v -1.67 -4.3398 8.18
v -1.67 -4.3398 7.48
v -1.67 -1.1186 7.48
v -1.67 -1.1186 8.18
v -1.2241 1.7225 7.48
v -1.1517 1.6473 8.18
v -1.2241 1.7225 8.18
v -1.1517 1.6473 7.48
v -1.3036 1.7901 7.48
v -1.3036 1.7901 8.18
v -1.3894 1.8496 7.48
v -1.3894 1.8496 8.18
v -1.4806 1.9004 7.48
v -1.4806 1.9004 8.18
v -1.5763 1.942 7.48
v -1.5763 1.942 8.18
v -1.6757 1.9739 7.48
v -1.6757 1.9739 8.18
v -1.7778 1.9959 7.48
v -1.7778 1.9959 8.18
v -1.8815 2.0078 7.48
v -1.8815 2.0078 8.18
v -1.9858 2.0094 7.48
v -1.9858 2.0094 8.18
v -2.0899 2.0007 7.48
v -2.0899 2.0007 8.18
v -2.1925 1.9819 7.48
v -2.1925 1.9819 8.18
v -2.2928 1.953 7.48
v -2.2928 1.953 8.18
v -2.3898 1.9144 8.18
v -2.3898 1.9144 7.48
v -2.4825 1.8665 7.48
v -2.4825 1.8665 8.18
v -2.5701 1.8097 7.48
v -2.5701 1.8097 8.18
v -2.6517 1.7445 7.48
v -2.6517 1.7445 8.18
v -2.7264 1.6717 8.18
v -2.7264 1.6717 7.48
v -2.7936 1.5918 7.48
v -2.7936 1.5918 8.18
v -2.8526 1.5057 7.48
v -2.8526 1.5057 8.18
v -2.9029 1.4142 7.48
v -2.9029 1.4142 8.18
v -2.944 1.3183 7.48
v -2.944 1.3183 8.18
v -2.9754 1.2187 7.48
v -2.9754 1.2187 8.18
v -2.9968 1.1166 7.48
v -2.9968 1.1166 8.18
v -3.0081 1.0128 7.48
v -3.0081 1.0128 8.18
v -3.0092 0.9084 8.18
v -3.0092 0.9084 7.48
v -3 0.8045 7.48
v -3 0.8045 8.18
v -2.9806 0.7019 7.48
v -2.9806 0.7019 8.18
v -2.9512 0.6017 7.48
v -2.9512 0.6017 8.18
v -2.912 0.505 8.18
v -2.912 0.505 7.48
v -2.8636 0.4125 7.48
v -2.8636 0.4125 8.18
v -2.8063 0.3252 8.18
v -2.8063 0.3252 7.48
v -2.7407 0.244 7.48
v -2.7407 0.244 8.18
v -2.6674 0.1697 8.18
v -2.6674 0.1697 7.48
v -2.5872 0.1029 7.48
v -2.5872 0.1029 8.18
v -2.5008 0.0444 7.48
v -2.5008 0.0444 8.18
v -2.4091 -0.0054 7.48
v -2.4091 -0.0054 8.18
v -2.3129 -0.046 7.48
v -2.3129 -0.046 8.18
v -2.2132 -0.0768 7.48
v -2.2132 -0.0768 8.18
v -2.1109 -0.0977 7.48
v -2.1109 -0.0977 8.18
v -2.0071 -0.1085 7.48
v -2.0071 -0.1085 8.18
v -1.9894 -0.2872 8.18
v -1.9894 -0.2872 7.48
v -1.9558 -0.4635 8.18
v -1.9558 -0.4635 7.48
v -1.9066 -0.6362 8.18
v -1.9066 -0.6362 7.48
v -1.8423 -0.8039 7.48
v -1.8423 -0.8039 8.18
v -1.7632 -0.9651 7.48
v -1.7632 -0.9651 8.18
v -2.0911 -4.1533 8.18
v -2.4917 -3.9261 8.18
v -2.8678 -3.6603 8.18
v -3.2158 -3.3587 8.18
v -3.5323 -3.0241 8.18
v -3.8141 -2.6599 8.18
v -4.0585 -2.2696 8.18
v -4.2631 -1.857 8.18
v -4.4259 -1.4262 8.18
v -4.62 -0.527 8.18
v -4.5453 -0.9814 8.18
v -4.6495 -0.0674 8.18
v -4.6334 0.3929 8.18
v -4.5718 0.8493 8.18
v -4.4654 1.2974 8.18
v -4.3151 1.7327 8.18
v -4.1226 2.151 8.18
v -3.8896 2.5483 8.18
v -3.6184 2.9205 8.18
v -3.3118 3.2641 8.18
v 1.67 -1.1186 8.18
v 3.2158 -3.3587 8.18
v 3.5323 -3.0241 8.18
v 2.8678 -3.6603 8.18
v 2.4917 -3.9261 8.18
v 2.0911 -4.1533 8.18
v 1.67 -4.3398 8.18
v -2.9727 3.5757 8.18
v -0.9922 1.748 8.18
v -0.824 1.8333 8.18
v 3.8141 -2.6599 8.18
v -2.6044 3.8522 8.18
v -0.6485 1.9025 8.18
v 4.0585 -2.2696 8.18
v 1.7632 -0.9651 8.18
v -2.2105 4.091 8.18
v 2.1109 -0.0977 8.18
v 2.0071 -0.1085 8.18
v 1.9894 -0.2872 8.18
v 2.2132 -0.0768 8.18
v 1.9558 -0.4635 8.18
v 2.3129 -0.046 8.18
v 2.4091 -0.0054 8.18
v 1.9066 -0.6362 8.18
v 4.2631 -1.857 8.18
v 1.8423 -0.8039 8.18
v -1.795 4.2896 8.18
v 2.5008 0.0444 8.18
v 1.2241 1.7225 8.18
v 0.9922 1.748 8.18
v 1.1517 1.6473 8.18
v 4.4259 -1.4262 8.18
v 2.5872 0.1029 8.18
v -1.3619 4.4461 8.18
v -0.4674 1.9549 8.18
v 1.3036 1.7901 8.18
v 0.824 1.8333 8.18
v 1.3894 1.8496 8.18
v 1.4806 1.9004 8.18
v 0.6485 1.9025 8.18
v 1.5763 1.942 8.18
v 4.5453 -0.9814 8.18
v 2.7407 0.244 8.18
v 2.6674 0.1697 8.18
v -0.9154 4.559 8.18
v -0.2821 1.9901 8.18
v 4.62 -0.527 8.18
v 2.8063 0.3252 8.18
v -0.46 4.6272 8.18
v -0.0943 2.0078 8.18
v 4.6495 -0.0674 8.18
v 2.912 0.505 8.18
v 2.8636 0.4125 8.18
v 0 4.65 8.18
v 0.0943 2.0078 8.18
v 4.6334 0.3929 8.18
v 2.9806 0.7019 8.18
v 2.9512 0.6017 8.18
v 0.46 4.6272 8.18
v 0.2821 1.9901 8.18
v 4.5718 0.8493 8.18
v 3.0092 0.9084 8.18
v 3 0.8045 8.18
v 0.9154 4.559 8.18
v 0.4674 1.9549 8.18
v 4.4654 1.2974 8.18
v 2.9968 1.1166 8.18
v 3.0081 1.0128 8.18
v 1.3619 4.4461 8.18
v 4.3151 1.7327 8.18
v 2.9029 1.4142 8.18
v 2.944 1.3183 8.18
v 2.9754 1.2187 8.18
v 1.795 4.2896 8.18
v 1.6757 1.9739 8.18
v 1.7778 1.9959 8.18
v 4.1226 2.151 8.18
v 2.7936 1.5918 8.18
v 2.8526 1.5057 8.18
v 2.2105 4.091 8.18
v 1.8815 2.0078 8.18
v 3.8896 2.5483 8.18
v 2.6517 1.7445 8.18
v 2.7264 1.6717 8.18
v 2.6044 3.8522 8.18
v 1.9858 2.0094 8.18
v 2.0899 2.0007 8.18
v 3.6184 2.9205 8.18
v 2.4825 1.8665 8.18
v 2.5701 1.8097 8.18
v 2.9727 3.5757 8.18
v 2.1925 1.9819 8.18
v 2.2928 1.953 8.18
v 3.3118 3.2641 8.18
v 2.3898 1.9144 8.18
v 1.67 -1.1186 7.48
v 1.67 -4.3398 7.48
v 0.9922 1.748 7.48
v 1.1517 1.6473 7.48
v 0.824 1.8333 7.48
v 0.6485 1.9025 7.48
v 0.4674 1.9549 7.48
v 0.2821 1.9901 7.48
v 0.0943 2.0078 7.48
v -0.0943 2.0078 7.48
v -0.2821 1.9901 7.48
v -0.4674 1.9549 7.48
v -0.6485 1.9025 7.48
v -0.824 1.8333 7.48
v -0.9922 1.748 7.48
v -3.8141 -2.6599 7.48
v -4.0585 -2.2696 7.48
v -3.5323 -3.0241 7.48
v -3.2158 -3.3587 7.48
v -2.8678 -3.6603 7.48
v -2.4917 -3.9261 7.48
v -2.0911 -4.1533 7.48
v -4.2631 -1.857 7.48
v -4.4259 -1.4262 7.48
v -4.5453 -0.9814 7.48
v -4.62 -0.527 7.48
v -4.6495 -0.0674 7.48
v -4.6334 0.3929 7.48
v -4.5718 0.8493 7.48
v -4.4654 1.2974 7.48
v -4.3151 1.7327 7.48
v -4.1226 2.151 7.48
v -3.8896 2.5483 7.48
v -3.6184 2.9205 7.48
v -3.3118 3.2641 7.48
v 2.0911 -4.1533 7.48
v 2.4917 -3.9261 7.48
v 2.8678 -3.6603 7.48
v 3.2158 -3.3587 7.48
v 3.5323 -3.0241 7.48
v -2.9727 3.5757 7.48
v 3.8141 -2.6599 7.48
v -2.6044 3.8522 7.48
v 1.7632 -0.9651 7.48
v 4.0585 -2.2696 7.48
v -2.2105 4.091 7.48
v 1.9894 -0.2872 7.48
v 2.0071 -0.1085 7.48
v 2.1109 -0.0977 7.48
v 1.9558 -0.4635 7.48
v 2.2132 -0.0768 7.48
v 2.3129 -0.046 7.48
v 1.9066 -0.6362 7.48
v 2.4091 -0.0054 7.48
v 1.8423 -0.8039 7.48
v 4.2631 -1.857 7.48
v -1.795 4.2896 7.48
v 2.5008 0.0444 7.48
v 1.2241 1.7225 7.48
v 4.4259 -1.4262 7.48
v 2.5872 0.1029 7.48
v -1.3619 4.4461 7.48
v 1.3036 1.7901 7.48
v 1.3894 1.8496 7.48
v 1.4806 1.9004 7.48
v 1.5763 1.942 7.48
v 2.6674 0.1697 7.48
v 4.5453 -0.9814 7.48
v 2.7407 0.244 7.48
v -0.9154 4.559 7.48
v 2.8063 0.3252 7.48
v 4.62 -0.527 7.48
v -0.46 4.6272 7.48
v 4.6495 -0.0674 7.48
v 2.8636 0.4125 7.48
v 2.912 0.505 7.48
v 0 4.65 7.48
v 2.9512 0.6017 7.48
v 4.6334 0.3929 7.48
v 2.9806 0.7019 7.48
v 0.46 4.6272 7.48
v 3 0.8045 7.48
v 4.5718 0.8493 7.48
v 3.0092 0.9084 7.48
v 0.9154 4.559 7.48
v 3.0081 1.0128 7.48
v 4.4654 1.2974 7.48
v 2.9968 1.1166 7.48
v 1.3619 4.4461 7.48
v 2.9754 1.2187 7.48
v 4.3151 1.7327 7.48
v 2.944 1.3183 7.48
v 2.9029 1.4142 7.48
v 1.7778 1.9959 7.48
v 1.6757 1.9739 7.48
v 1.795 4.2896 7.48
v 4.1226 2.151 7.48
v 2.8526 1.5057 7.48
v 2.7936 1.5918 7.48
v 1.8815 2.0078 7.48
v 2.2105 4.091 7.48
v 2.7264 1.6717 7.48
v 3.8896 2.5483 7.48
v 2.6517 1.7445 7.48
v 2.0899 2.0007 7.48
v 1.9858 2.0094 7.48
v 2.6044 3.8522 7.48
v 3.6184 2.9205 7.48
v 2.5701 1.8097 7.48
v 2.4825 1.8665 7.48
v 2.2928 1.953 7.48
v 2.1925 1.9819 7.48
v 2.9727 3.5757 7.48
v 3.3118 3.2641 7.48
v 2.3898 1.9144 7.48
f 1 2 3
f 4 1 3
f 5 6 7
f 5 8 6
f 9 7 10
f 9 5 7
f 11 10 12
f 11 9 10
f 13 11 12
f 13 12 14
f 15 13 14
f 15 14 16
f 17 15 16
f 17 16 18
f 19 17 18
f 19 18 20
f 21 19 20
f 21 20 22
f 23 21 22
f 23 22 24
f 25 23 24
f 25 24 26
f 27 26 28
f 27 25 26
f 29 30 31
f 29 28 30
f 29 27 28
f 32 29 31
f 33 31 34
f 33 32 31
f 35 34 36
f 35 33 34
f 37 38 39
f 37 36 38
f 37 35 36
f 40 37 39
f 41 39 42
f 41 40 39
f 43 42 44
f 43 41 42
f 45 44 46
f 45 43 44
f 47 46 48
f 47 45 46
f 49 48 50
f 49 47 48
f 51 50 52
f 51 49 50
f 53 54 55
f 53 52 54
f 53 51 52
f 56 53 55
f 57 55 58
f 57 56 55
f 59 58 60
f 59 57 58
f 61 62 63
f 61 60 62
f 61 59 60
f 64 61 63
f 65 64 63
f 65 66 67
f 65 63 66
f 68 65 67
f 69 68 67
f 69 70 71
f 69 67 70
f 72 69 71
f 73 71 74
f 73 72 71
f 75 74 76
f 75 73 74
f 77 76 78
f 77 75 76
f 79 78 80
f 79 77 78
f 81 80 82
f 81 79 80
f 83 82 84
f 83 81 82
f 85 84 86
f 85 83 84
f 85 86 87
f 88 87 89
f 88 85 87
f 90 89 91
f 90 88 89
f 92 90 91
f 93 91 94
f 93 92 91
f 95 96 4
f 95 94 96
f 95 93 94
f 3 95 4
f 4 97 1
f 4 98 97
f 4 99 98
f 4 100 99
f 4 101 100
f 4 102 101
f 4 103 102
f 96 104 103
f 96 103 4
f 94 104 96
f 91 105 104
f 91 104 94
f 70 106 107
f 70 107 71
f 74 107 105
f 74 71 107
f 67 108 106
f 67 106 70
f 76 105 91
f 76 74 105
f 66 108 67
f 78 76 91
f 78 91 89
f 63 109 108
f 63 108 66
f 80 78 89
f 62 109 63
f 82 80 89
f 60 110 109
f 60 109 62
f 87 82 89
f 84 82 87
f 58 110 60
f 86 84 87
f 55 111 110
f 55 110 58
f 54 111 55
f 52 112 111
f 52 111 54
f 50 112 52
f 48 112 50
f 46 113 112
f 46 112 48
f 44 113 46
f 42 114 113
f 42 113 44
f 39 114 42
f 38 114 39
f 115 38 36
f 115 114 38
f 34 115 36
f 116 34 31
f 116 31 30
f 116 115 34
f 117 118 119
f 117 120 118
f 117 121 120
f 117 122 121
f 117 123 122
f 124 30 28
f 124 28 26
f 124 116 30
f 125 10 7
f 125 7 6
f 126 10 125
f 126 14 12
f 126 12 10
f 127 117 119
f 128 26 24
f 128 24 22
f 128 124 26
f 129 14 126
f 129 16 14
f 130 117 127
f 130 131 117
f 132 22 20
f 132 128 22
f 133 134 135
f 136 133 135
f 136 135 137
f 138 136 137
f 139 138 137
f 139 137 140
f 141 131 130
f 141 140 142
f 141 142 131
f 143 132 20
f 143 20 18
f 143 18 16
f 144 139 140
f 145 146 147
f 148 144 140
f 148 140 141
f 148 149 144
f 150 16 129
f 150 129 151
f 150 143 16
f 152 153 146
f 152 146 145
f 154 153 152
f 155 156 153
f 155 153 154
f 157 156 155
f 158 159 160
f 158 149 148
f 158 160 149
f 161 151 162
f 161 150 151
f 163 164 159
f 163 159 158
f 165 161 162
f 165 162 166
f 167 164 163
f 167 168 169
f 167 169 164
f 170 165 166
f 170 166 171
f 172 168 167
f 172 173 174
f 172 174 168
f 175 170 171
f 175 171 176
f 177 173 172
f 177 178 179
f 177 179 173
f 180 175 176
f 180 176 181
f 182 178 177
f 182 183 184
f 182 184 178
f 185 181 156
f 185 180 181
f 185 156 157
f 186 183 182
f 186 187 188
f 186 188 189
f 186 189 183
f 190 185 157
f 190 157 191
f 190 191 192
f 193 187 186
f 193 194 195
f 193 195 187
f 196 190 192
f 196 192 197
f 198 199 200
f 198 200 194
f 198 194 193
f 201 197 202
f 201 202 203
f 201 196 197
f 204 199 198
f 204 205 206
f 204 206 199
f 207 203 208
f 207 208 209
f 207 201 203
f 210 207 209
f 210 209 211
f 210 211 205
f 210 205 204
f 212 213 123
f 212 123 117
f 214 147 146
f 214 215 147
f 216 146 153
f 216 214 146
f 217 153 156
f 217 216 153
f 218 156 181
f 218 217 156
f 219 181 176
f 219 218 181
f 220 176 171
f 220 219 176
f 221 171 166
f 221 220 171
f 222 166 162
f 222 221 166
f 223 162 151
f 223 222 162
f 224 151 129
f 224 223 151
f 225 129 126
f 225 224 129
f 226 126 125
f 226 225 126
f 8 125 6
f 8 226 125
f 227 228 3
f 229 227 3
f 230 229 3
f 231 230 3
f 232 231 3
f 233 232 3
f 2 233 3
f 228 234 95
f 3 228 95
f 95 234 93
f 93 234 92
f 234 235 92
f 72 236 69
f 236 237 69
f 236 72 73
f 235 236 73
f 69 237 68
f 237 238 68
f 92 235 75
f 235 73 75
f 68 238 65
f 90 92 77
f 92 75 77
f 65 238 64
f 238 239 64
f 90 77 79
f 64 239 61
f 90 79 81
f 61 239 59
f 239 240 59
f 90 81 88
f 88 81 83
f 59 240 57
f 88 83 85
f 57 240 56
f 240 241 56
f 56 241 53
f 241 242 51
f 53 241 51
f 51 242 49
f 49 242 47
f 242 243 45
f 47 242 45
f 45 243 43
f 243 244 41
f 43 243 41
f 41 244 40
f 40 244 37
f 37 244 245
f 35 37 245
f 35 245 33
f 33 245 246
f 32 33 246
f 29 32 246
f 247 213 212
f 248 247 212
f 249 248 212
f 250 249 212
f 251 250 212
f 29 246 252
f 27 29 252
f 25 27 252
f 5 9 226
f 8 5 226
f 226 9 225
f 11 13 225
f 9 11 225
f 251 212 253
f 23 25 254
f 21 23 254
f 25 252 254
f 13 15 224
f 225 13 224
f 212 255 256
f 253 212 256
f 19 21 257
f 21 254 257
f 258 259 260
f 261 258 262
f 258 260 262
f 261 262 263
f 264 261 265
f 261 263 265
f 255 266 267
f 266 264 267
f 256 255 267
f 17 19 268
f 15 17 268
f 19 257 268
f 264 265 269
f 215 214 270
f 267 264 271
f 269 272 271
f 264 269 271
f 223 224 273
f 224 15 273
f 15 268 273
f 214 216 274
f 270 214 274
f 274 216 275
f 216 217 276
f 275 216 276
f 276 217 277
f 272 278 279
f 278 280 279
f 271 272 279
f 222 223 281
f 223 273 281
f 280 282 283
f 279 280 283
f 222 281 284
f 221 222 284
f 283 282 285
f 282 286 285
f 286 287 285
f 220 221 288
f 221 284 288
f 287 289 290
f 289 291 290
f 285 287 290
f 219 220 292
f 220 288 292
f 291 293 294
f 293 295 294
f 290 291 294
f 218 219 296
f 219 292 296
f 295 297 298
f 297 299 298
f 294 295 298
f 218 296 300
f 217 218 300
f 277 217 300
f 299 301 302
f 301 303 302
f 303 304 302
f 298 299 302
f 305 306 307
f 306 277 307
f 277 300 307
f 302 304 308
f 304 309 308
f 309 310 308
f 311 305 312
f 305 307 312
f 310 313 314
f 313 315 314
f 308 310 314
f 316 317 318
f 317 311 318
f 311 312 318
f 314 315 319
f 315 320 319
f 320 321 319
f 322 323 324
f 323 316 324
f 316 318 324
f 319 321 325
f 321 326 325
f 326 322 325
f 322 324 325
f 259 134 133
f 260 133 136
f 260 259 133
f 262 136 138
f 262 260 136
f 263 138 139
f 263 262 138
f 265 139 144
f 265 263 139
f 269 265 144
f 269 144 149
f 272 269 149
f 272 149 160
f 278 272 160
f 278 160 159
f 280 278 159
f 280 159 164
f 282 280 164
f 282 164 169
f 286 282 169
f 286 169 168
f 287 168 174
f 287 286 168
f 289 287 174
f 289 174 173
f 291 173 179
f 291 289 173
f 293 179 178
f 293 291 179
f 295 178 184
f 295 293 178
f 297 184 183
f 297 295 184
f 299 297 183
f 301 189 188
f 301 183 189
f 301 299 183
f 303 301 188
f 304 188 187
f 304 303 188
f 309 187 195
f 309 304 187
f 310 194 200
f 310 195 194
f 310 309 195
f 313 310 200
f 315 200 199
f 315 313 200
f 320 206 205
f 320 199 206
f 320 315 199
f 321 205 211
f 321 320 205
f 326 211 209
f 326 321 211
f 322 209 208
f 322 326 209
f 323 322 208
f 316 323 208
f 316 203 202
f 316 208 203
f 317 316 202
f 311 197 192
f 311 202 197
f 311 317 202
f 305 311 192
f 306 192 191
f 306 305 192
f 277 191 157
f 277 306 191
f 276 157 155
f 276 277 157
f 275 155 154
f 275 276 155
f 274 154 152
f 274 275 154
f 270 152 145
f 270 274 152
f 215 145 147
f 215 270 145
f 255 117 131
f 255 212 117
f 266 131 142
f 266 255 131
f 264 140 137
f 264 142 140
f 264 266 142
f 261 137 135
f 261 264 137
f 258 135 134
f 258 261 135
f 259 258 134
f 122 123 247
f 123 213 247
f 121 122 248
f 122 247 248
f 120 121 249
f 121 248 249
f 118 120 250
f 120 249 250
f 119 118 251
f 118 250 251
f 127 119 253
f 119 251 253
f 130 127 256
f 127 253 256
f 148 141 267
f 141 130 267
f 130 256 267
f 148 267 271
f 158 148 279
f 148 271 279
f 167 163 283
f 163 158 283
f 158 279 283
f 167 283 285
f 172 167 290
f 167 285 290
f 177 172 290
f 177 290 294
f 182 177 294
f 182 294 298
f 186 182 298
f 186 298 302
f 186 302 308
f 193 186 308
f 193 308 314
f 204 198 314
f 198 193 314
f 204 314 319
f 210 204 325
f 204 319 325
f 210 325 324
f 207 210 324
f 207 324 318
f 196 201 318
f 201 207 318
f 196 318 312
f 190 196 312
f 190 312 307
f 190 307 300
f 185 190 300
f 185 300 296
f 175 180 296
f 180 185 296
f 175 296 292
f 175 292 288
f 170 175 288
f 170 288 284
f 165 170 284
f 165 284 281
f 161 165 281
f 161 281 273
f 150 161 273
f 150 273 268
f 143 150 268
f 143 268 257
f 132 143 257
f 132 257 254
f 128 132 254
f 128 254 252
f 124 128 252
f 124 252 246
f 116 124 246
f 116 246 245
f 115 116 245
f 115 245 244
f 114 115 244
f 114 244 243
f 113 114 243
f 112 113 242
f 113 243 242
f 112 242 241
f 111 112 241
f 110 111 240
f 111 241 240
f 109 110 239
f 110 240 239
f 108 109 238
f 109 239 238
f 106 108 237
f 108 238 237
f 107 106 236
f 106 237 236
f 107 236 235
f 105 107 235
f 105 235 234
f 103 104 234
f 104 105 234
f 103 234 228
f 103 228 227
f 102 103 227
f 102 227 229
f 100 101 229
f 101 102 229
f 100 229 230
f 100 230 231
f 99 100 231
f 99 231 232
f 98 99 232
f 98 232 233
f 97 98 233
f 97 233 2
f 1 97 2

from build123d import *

# Parameters (mm, degrees)
F_01_START                                = 7.48
S01_INSTALLED_SPRING_CLIP_ENVELOPE_R      = 4.65
S01_INSTALLED_SPRING_CLIP_ENVELOPE_R_2    = 2.01
F_01_INSTALLED_SPRING_CLIP_ENVELOPE_DEPTH = 0.7
F_02_START                                = 7.46
S02_RADIAL_ENTRY_OPENING_W                = 3.34
S02_RADIAL_ENTRY_OPENING_H                = 5.1
F_02_RADIAL_ENTRY_OPENING_DEPTH           = 0.75
F_03_START                                = 7.46
S03_LEFT_SPRING_RELIEF_R                  = 1.06
F_03_LEFT_SPRING_RELIEF_DEPTH             = 0.75
F_04_START                                = 7.46
S04_RIGHT_SPRING_RELIEF_R                 = 1.06
F_04_RIGHT_SPRING_RELIEF_DEPTH            = 0.75


with BuildPart() as part:
    # S01 - Installed spring clip envelope → 01 - Installed spring clip envelope (new body)
    with BuildSketch(Plane.XY.offset(F_01_START)):
        Circle(S01_INSTALLED_SPRING_CLIP_ENVELOPE_R)
        Circle(S01_INSTALLED_SPRING_CLIP_ENVELOPE_R_2, mode=Mode.SUBTRACT)
    extrude(amount=F_01_INSTALLED_SPRING_CLIP_ENVELOPE_DEPTH)

    # S02 - Radial entry opening → 02 - Radial entry opening (cut)
    with BuildSketch(Plane.XY.offset(F_02_START)):
        with Locations((0, -2.25)):
            Rectangle(S02_RADIAL_ENTRY_OPENING_W, S02_RADIAL_ENTRY_OPENING_H)
    extrude(amount=F_02_RADIAL_ENTRY_OPENING_DEPTH, mode=Mode.SUBTRACT)

    # S03 - Left spring relief → 03 - Left spring relief (cut)
    with BuildSketch(Plane.XY.offset(F_03_START)):
        with Locations((-1.95, 0.95)):
            Circle(S03_LEFT_SPRING_RELIEF_R)
    extrude(amount=F_03_LEFT_SPRING_RELIEF_DEPTH, mode=Mode.SUBTRACT)

    # S04 - Right spring relief → 04 - Right spring relief (cut)
    with BuildSketch(Plane.XY.offset(F_04_START)):
        with Locations((1.95, 0.95)):
            Circle(S04_RIGHT_SPRING_RELIEF_R)
    extrude(amount=F_04_RIGHT_SPRING_RELIEF_DEPTH, mode=Mode.SUBTRACT)


solid = part.part
